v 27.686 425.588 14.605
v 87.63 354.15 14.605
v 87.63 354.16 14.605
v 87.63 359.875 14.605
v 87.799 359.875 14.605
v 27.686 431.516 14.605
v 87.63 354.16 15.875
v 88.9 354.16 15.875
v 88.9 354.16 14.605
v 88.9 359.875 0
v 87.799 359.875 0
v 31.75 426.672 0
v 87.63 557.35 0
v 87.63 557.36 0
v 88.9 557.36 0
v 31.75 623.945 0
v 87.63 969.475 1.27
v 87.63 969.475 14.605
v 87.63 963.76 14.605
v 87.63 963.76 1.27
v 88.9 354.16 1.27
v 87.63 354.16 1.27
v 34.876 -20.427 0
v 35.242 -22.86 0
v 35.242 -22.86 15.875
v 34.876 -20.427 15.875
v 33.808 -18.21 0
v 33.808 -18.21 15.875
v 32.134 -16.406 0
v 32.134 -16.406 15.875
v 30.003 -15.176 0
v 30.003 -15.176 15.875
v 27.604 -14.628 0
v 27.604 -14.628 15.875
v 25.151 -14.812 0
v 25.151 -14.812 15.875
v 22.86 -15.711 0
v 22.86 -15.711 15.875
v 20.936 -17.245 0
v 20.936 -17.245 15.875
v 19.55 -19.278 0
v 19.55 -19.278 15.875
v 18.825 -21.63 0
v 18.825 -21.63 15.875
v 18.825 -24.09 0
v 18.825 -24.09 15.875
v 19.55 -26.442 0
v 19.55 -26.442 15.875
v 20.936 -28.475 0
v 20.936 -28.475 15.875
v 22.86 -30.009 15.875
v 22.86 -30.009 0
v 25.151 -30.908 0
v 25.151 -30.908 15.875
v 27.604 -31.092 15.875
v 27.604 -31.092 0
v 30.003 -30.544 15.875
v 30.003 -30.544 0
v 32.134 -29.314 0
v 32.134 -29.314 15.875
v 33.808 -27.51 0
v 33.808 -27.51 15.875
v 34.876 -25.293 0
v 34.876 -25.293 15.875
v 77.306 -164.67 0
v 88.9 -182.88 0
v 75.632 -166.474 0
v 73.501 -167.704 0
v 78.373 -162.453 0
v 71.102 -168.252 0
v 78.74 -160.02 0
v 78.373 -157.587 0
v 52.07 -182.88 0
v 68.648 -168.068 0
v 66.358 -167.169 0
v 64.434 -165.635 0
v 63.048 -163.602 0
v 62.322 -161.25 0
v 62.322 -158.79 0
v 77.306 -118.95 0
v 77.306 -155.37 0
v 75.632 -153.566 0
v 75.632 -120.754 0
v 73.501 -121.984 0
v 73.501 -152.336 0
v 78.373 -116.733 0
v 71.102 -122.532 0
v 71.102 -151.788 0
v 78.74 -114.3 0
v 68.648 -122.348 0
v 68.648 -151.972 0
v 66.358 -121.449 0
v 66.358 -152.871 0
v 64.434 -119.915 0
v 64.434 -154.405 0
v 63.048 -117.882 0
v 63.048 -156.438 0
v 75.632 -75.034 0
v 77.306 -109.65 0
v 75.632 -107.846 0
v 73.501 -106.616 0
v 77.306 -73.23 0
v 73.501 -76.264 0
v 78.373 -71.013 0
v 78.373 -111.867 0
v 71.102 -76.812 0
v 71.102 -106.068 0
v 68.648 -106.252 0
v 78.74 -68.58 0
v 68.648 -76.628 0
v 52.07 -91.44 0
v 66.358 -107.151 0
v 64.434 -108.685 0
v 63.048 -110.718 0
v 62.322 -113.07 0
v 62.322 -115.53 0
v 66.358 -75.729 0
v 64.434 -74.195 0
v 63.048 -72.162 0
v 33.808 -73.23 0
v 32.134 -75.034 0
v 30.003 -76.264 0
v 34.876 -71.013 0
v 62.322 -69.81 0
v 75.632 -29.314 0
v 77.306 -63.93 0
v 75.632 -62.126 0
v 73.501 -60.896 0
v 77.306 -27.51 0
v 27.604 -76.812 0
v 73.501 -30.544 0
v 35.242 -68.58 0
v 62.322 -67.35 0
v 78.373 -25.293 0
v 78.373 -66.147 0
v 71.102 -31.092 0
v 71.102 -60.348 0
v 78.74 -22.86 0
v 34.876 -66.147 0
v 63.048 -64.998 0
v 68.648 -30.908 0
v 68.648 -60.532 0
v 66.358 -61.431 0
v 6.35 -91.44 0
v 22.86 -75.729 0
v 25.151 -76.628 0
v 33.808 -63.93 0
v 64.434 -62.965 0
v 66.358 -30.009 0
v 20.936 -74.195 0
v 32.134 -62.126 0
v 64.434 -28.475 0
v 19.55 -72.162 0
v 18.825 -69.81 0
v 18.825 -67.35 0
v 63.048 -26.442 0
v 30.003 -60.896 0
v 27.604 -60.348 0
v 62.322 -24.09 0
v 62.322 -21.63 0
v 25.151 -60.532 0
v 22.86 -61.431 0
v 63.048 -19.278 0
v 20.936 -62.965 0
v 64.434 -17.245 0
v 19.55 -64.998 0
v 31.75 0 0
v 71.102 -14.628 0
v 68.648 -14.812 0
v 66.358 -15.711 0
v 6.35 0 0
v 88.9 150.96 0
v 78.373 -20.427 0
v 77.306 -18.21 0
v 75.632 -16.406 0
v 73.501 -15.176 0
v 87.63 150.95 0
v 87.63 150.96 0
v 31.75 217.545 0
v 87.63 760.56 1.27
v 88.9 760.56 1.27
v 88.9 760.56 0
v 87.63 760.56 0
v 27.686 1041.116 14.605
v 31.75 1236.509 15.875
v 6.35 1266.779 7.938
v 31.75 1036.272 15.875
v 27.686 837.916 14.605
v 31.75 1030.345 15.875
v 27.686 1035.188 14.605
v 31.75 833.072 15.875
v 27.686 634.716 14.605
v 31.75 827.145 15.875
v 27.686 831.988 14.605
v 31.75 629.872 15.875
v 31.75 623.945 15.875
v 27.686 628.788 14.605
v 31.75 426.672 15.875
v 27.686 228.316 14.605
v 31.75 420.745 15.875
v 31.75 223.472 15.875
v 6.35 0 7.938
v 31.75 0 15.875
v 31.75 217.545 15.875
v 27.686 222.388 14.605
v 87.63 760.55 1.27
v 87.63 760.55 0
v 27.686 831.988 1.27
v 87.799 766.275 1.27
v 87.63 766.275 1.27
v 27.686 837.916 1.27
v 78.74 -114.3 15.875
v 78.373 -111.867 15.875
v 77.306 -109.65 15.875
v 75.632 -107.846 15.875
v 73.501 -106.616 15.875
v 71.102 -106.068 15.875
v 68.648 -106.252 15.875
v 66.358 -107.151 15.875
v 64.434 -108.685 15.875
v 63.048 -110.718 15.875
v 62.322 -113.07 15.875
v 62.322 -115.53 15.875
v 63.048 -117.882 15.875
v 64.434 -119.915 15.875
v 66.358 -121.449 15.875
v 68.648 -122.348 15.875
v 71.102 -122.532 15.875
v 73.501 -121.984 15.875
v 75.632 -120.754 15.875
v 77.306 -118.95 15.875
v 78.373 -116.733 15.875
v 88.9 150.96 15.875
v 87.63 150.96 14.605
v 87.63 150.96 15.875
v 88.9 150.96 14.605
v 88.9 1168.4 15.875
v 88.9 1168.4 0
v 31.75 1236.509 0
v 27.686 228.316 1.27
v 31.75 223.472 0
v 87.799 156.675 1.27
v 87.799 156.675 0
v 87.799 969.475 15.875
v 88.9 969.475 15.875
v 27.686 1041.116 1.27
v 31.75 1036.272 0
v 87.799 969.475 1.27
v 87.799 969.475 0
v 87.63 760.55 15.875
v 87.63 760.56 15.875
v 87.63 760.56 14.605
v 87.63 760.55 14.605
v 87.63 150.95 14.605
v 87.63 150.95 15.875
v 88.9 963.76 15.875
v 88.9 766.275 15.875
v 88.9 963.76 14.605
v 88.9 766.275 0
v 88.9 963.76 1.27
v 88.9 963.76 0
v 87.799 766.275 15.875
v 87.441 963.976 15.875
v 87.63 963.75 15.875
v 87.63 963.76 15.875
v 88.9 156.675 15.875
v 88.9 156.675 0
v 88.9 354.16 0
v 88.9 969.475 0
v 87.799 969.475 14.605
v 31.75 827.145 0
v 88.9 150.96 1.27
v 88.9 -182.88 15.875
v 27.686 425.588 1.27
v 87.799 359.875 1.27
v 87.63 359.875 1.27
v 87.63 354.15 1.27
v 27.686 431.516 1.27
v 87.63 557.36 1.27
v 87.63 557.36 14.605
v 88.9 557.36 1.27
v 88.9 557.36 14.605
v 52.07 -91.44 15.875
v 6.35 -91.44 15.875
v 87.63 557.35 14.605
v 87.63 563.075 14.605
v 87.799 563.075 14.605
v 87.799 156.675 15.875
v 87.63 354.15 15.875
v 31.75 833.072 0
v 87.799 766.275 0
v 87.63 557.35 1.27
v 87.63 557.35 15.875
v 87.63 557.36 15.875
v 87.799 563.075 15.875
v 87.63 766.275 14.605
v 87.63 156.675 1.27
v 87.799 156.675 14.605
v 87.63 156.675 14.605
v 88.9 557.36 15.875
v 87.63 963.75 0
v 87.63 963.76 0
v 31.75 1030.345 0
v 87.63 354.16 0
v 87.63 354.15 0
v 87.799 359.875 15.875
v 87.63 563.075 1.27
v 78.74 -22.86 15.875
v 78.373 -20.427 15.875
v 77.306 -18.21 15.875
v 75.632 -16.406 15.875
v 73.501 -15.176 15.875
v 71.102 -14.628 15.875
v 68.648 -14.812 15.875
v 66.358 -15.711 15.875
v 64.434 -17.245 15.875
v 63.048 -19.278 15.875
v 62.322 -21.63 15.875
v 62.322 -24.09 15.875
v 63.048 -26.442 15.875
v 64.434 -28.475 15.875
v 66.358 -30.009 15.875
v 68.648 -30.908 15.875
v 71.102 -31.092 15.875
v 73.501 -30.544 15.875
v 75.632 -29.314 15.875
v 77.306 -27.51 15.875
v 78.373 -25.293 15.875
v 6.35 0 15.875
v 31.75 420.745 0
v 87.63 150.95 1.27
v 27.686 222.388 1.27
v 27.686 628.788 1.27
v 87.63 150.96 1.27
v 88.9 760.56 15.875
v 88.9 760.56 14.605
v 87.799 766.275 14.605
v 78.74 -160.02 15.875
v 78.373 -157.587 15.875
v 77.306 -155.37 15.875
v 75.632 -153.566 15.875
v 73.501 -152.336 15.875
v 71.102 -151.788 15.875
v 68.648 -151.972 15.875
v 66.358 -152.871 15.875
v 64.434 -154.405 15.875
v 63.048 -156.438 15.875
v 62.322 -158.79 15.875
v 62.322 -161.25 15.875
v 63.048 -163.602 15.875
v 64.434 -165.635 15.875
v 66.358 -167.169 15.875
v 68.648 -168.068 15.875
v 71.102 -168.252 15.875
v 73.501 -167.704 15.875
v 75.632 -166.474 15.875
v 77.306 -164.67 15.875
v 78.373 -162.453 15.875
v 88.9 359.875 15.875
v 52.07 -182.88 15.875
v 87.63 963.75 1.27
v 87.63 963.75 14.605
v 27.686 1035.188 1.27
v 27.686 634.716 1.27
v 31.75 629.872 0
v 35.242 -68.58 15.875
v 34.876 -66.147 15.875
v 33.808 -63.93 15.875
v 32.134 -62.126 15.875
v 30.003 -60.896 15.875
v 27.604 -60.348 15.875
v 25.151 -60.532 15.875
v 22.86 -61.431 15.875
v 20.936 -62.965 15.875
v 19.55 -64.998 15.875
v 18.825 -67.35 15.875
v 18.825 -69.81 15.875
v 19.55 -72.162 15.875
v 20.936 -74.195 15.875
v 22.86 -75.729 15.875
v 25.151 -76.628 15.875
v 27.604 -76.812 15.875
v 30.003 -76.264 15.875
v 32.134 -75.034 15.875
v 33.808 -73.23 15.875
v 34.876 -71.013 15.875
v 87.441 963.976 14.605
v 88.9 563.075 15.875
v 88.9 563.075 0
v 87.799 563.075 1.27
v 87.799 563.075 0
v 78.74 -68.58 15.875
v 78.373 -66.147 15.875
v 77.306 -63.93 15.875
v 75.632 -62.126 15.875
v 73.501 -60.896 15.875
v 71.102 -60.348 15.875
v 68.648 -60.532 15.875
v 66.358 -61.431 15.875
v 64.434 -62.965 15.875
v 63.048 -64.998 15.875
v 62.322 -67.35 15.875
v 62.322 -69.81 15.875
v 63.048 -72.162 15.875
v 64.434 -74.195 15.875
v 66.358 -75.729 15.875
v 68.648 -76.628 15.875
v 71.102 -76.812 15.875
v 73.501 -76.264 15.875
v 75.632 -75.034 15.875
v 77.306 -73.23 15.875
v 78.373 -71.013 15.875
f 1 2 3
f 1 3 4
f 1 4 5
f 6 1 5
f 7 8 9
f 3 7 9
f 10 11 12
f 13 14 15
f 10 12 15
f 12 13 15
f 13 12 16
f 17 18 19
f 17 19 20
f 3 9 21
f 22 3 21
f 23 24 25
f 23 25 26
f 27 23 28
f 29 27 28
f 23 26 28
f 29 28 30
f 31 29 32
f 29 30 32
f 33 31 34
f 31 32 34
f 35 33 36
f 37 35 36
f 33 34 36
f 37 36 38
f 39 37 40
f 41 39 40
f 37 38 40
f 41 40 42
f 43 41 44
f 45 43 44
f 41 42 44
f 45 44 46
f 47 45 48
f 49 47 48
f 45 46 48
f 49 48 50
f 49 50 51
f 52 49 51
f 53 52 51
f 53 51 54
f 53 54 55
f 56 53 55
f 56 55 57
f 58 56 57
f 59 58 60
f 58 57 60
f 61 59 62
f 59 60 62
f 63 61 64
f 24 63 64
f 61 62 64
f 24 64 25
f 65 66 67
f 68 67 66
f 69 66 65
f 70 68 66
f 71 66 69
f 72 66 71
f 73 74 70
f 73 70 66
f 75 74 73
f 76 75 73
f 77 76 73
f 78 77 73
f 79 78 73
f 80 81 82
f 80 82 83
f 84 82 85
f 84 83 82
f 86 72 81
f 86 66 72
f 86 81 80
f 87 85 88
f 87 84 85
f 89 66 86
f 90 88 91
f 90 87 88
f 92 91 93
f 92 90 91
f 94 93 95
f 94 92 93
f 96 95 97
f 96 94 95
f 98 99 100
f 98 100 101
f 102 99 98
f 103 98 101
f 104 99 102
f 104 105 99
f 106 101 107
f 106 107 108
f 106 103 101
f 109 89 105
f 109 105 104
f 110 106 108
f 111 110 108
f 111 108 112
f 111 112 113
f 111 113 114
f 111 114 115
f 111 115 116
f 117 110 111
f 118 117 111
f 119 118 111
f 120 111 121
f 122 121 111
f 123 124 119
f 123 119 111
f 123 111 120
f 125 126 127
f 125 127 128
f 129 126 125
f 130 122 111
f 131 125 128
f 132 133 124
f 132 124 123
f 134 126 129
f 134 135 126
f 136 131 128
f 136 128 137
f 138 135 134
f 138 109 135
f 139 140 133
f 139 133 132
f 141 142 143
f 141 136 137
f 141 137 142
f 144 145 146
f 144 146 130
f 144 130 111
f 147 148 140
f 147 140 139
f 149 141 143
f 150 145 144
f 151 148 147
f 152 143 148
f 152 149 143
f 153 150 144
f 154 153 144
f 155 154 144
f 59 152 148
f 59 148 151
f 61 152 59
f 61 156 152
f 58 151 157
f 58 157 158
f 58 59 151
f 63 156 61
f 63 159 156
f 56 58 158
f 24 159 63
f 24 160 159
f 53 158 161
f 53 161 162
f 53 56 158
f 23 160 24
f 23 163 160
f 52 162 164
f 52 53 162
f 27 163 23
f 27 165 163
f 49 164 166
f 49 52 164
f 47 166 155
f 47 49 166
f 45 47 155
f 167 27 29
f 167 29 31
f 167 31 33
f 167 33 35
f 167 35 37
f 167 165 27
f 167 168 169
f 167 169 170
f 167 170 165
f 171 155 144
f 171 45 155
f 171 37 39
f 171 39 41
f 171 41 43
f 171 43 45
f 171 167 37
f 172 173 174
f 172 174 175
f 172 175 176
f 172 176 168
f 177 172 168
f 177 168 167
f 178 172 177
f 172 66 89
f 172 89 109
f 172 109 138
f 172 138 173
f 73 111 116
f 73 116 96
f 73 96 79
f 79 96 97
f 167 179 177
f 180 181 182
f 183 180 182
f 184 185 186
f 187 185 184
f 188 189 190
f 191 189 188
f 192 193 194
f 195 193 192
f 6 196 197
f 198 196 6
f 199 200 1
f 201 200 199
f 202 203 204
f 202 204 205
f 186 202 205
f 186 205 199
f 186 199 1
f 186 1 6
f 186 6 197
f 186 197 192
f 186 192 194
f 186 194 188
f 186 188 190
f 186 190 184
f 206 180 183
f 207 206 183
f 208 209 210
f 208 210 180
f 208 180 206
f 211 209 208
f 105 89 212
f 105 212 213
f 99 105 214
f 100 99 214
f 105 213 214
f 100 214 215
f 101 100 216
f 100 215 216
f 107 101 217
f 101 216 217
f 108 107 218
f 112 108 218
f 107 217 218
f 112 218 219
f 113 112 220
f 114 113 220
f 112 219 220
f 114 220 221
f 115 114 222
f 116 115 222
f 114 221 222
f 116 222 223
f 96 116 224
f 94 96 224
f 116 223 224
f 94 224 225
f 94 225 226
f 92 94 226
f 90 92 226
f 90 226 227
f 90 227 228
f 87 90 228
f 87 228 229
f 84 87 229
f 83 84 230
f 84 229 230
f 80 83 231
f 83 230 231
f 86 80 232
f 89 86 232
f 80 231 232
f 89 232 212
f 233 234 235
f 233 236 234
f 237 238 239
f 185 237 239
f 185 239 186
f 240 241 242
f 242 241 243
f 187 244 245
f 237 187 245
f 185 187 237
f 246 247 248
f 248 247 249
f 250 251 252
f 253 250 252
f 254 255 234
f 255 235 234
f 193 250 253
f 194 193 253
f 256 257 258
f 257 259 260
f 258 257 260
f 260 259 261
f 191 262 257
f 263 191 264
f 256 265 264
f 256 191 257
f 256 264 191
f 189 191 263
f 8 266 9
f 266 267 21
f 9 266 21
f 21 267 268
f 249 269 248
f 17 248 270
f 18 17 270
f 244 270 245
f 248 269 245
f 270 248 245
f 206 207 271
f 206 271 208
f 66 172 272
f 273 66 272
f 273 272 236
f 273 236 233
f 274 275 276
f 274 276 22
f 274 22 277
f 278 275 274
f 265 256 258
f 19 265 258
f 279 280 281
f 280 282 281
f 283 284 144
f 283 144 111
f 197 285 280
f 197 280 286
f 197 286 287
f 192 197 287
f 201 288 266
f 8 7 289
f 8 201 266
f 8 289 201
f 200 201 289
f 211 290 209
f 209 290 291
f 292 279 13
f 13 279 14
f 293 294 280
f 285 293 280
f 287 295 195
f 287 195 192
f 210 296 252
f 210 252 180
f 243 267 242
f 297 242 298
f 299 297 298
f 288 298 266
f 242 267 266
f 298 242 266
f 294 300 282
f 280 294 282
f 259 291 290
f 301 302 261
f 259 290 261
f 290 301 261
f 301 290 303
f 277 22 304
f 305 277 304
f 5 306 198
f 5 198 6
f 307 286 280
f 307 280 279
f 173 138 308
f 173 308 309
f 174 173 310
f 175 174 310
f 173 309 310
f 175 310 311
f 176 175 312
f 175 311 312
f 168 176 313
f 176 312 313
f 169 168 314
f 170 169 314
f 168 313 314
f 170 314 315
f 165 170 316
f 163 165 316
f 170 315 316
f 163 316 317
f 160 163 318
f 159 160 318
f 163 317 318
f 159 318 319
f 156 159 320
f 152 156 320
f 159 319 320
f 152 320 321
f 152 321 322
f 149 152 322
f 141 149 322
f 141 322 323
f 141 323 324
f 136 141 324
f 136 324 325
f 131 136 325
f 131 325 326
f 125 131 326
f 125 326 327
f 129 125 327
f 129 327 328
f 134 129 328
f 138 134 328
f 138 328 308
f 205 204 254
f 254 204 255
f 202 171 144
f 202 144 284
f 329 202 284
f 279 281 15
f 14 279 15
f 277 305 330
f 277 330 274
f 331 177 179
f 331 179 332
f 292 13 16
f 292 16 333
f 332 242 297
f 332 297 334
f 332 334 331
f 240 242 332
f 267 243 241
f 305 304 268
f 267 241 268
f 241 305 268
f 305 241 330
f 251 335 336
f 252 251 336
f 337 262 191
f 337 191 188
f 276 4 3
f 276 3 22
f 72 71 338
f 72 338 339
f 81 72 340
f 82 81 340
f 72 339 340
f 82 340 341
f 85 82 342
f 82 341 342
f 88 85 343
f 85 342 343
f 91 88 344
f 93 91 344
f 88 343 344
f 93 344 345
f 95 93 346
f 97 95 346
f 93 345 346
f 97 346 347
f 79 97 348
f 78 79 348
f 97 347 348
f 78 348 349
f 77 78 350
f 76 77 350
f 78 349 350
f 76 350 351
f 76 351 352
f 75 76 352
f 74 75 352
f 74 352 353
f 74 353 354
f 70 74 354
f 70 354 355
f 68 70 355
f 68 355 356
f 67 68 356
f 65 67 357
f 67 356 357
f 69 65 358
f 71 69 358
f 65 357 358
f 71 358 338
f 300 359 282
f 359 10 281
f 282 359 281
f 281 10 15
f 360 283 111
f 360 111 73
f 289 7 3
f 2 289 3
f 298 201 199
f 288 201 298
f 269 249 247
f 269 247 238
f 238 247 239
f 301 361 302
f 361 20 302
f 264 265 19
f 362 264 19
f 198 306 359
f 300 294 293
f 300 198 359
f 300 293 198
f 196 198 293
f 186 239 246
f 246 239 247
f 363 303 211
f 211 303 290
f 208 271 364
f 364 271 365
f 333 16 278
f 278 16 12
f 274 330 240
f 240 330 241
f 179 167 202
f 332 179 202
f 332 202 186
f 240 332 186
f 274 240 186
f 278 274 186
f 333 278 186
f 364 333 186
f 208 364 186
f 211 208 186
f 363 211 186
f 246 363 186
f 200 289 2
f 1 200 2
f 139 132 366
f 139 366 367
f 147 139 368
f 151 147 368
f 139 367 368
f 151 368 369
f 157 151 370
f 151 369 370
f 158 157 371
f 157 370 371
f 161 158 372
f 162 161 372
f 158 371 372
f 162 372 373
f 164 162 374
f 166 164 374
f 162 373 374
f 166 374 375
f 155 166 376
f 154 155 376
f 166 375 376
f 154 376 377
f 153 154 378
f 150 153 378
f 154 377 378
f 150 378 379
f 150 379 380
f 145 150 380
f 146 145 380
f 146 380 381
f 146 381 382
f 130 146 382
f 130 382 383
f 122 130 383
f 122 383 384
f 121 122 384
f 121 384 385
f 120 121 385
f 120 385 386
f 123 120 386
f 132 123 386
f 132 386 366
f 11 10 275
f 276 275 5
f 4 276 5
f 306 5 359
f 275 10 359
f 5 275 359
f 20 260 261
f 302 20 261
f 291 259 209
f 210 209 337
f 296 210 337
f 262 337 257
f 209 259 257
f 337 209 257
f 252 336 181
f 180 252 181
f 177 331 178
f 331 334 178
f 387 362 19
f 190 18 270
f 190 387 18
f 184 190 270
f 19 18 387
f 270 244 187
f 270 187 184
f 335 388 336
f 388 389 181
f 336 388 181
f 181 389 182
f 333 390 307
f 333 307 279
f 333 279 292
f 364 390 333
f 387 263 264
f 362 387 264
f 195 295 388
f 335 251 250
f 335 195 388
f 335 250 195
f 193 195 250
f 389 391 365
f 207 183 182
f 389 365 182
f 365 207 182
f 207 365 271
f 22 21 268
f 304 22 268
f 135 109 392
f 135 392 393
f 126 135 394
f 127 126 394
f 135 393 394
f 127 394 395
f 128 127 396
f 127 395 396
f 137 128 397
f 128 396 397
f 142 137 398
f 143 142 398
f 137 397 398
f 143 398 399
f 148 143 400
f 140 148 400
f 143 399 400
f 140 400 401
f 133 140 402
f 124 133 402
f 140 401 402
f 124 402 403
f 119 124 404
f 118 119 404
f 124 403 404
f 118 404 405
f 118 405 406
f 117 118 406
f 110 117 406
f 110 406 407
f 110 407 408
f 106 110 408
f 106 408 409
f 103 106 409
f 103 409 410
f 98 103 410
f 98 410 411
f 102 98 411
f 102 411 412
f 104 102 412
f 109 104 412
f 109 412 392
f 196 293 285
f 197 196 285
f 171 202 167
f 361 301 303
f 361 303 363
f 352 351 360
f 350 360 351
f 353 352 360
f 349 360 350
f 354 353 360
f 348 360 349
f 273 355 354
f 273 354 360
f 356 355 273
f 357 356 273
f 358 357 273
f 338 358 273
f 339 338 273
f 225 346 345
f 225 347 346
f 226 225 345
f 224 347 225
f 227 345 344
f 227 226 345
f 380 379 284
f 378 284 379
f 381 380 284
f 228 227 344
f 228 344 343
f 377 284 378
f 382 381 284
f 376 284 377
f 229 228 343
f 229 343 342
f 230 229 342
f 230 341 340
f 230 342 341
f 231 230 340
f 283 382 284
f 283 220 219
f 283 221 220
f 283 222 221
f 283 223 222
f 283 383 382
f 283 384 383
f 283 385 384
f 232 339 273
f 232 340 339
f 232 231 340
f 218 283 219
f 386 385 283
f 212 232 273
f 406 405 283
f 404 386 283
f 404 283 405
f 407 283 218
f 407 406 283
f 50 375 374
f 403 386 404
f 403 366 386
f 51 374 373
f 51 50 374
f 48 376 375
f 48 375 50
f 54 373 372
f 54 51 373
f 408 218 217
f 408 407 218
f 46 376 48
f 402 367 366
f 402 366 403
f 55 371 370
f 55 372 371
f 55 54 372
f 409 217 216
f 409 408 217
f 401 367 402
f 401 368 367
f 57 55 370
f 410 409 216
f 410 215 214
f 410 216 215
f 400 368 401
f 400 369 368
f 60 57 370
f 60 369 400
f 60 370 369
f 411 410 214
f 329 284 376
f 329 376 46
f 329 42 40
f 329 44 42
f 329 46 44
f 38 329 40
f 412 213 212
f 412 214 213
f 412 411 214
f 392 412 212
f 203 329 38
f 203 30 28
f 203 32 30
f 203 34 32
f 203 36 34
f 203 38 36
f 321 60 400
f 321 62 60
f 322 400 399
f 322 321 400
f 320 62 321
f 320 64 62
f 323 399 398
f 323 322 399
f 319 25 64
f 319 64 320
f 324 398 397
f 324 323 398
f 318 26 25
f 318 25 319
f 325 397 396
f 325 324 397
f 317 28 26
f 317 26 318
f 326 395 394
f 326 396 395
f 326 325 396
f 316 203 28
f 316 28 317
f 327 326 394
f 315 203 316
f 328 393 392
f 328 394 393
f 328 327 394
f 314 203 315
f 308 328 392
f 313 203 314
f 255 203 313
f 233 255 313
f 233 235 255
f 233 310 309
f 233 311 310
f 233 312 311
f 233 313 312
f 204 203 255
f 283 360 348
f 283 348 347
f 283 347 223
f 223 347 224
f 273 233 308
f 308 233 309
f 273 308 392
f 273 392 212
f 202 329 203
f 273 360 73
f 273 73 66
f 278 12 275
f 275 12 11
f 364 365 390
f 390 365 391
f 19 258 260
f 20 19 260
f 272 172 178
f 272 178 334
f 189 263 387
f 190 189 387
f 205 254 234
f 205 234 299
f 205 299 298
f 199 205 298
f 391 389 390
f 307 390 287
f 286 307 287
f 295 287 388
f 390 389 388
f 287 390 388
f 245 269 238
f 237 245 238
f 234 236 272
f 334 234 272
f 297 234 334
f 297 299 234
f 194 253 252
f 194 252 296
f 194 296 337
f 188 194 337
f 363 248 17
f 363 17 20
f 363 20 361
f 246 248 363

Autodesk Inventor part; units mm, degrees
ref_plane "YZ Plane" through (0, 0, 0) normal (1, 0, 0) x (0, 1, 0)
ref_plane "XZ Plane" through (0, 0, 0) normal (0, 1, 0) x (-1, 0, 0)
ref_plane "XY Plane" through (0, 0, 0) normal (0, 0, 1) x (1, 0, 0)
sketch "Sketch1" plane through (0, 0, 0) normal (0, 0, 1) x (1, 0, 0)
  line L0 (0, 0) -> (88.9, 0)
  line L1 (88.9, 0) -> (88.9, 1168.4)
  line L2 (0, 1168.4) -> (0, 0)
  line L3 (-1378.8531, -765.1447) -> (-1378.8531, 1773.0142) construction
  line L4 (-1378.8531, 1773.0142) -> (415.5122, 1773.0142) construction
  line L5 (415.5122, 1773.0142) -> (415.5122, -765.1447) construction
  line L6 (415.5122, -765.1447) -> (-1378.8531, -765.1447) construction
  line L7 (44.45, 1168.4) -> (176.9474, 1168.4) construction
  line L8 (0, 1168.4) -> (0, 1119.7734)
  line L9 (88.9, 1168.4) -> (0, 1274.3469)
  line L10 (0, 1168.4) -> (0, 1274.3469)
  line L11 (88.9, 1168.4) -> (88.9, 1229.5585)
  line L12 (88.9, 1168.4) -> (88.9, 965.2)
  line L13 (88.9, 965.2) -> (88.9, 762)
  line L14 (88.9, 762) -> (88.9, 558.8)
  line L15 (88.9, 558.8) -> (88.9, 355.6)
  line L16 (88.9, 355.6) -> (88.9, 152.4)
  line L17 (88.9, 965.2) -> (-57.897, 1140.1458)
  line L18 (88.9, 965.2) -> (317.2756, 965.2) construction
  line L19 (88.9, 762) -> (-57.897, 936.9458)
  line L20 (88.9, 762) -> (317.2756, 762) construction
  line L21 (88.9, 558.8) -> (-71.0436, 749.4133)
  line L22 (88.9, 558.8) -> (337.728, 558.8) construction
  line L23 (88.9, 355.6) -> (-47.9591, 518.7023)
  line L24 (88.9, 355.6) -> (301.815, 355.6) construction
  line L25 (88.9, 152.4) -> (-31.1466, 295.4659)
  line L26 (88.9, 152.4) -> (275.6593, 152.4) construction
  line L27 (88.9, 152.4) -> (137.8508, 94.0627)
  line L28 (88.9, 355.6) -> (128.9332, 307.8903)
  line L29 (88.9, 558.8) -> (137.8508, 500.4627)
  line L30 (88.9, 762) -> (152.1538, 686.617)
  line L31 (-57.897, 936.9458) -> (152.1538, 686.617)
  line L32 (-71.0436, 749.4133) -> (137.8508, 500.4627)
  line L33 (-47.9591, 518.7023) -> (128.9332, 307.8903)
  line L34 (-31.1466, 295.4659) -> (137.8508, 94.0627)
  line L35 (164.9833, 874.5275) -> (-78.8863, 1165.1599)
  line L36 (90.3593, 966.4245) -> (-56.4377, 1141.3704)
  line L37 (87.4407, 963.9755) -> (-59.3563, 1138.9213)
  line L38 (157.3047, 680.4784) -> (-71.0436, 952.6133)
  line L39 (158.764, 681.7029) -> (-69.5842, 953.8378)
  line L40 (155.8454, 679.2539) -> (-72.5029, 951.3888)
  line L41 (144.9042, 492.0568) -> (-84.555, 765.5156)
  line L42 (146.3635, 493.2813) -> (-83.0956, 766.7401)
  line L43 (143.4449, 490.8323) -> (-86.0143, 764.2911)
  line L44 (137.8508, 297.2627) -> (-69.5842, 544.4742)
  line L45 (139.3101, 298.4872) -> (-68.1249, 545.6987)
  line L46 (136.3915, 296.0382) -> (-71.0436, 543.2497)
  line L47 (-41.5719, 307.8903) -> (172.2961, 53.0124)
  line L48 (-40.1126, 309.1148) -> (173.7555, 54.2369)
  line L49 (-43.0312, 306.6658) -> (170.8368, 51.7878)
  line L50 (87.4407, 963.9755) -> (94.264, 955.8438)
  dimension "d0" = 88.9
  dimension "d1" = 1168.4
  dimension "d23" = 40
  dimension "d37" = 1.905
  dimension "d38" = 1.905
  dimension "d39" = 1.905
  dimension "d40" = 1.905
  dimension "d41" = 1.905
  dimension "d42" = 1.905
  dimension "d43" = 1.905
  dimension "d44" = 1.905
  dimension "d45" = 1.905
  dimension "d46" = 1.905
  dimension "d129" = 105.9469
extrude "Extrusion1" add sketch "Sketch1" along normal blind 15.875
sketch "Sketch2" plane through (0, 0, 15.875) normal (0, 0, 1) x (1, 0, 0)
  line L0 (0, 0) -> (88.9, 0)
  line L1 (88.9, 0) -> (88.9, 1168.4)
  line L2 (0, 1168.4) -> (0, 0)
  line L3 (-1378.8531, -765.1447) -> (-1378.8531, 1773.0142) construction
  line L4 (-1378.8531, 1773.0142) -> (415.5122, 1773.0142) construction
  line L5 (415.5122, 1773.0142) -> (415.5122, -765.1447) construction
  line L6 (415.5122, -765.1447) -> (-1378.8531, -765.1447) construction
  line L7 (44.45, 1168.4) -> (176.9474, 1168.4) construction
  line L8 (0, 1168.4) -> (0, 1119.7734)
  line L9 (88.9, 1168.4) -> (0, 1274.3469)
  line L10 (0, 1168.4) -> (0, 1274.3469)
  line L11 (88.9, 1168.4) -> (88.9, 1229.5585)
  line L12 (88.9, 1168.4) -> (88.9, 965.2)
  line L13 (88.9, 965.2) -> (88.9, 762)
  line L14 (88.9, 762) -> (88.9, 558.8)
  line L15 (88.9, 558.8) -> (88.9, 355.6)
  line L16 (88.9, 355.6) -> (88.9, 152.4)
  line L17 (88.9, 965.2) -> (-57.897, 1140.1458)
  line L18 (88.9, 965.2) -> (317.2756, 965.2) construction
  line L19 (88.9, 762) -> (-57.897, 936.9458)
  line L20 (88.9, 762) -> (317.2756, 762) construction
  line L21 (88.9, 558.8) -> (-71.0436, 749.4133)
  line L22 (88.9, 558.8) -> (337.728, 558.8) construction
  line L23 (88.9, 355.6) -> (-47.9591, 518.7023)
  line L24 (88.9, 355.6) -> (301.815, 355.6) construction
  line L25 (88.9, 152.4) -> (-31.1466, 295.4659)
  line L26 (88.9, 152.4) -> (275.6593, 152.4) construction
  line L27 (88.9, 152.4) -> (137.8508, 94.0627)
  line L28 (88.9, 355.6) -> (128.9332, 307.8903)
  line L29 (88.9, 558.8) -> (137.8508, 500.4627)
  line L30 (88.9, 762) -> (152.1538, 686.617)
  line L31 (-57.897, 936.9458) -> (152.1538, 686.617)
  line L32 (-71.0436, 749.4133) -> (137.8508, 500.4627)
  line L33 (-47.9591, 518.7023) -> (128.9332, 307.8903)
  line L34 (-31.1466, 295.4659) -> (137.8508, 94.0627)
  line L35 (164.9833, 874.5275) -> (-78.8863, 1165.1599)
  line L36 (90.3593, 966.4245) -> (-56.4377, 1141.3704)
  line L37 (87.4407, 963.9755) -> (-59.3563, 1138.9213)
  line L38 (157.3047, 680.4784) -> (-71.0436, 952.6133)
  line L39 (158.764, 681.7029) -> (-69.5842, 953.8378)
  line L40 (155.8454, 679.2539) -> (-72.5029, 951.3888)
  line L41 (144.9042, 492.0568) -> (-84.555, 765.5156)
  line L42 (146.3635, 493.2813) -> (-83.0956, 766.7401)
  line L43 (143.4449, 490.8323) -> (-86.0143, 764.2911)
  line L44 (137.8508, 297.2627) -> (-69.5842, 544.4742)
  line L45 (139.3101, 298.4872) -> (-68.1249, 545.6987)
  line L46 (136.3915, 296.0382) -> (-71.0436, 543.2497)
  line L47 (-41.5719, 307.8903) -> (172.2961, 53.0124)
  line L48 (-40.1126, 309.1148) -> (173.7555, 54.2369)
  line L49 (-43.0312, 306.6658) -> (170.8368, 51.7878)
  line L50 (87.4407, 963.9755) -> (94.264, 955.8438)
  point P0 (88.9, 962.2363)
  point P1 (88.9, 968.1637)
  point P2 (0, 1074.1105)
  point P3 (0, 1068.1832)
  point P4 (0, 864.9832)
  point P5 (88.9, 759.0363)
  point P6 (88.9, 764.9637)
  point P7 (0, 870.9105)
  point P8 (0, 661.7832)
  point P9 (88.9, 555.8363)
  point P10 (88.9, 561.7637)
  point P11 (0, 667.7105)
  point P12 (0, 458.5832)
  point P13 (88.9, 352.6363)
  point P14 (88.9, 358.5637)
  point P15 (0, 464.5105)
  point P16 (88.9, 155.3637)
  point P17 (0, 261.3105)
  point P18 (0, 255.3832)
  point P19 (88.9, 149.4363)
  dimension "d49" = 88.9
  dimension "d50" = 1168.4
  dimension "d51" = 40
  dimension "d52" = 1.905
  dimension "d53" = 1.905
  dimension "d54" = 1.905
  dimension "d55" = 1.905
  dimension "d56" = 1.905
  dimension "d57" = 1.905
  dimension "d58" = 1.905
  dimension "d59" = 1.905
  dimension "d60" = 1.905
  dimension "d61" = 1.905
extrude "Extrusion2" cut sketch "Sketch2" against normal blind 1.27 contours L2 L25 L1 L49 | L2 L48 L1 L25 | L2 L23 L1 L46 | L2 L45 L1 L23 | L2 L21 L1 L43 | L2 L42 L1 L21 | L2 L19 L1 L40 | L2 L39 L1 L19 | L2 L17 L1 L50 L37 | L2 L36 L1 L17
sketch "Sketch3" plane through (0, 0, 0) normal (0, 0, -1) x (-1, 0, 0)
  line L0 (-88.9, 149.4363) -> (0, 255.3832) projected
  line L1 (0, 261.3105) -> (-88.9, 155.3637) projected
  line L2 (0, 464.5105) -> (-88.9, 358.5637) projected
  line L3 (-88.9, 352.6363) -> (0, 458.5832) projected
  line L4 (-88.9, 555.8363) -> (0, 661.7832) projected
  line L5 (0, 667.7105) -> (-88.9, 561.7637) projected
  line L6 (-88.9, 759.0363) -> (0, 864.9832) projected
  line L7 (0, 870.9105) -> (-88.9, 764.9637) projected
  line L8 (-88.9, 962.2363) -> (0, 1068.1832) projected
  line L9 (0, 1074.1105) -> (-88.9, 968.1637) projected
  line L10 (0, 1274.3469) -> (0, 0) projected
  line L11 (-88.9, 1168.4) -> (0, 1274.3469) projected
  line L12 (-88.9, 0) -> (-88.9, 1168.4) projected
  line L13 (0, 0) -> (-88.9, 0) projected
extrude "Extrusion3" cut sketch "Sketch3" against normal blind 1.27 contours L12 L1 L10 L0 | L12 L2 L10 L3 | L12 L5 L10 L4 | L12 L7 L10 L6 | L12 L9 L10 L8
sketch "Sketch4" plane through (88.9, 968.1637, 15.875) normal (1, 0, 0) x (0, 0, -1)
  line L0 (-0.8567, 45.5077) -> (24.5433, 45.5077)
  line L1 (24.5433, 45.5077) -> (24.5433, 51.2227)
  line L2 (24.5433, 51.2227) -> (-0.8567, 51.2227)
  line L3 (-0.8567, 51.2227) -> (-0.8567, 45.5077)
  line L4 (1.27, -5.9273) -> (0, -5.9273) projected
  line L5 (0, -5.9273) -> (0, -4.4033)
  line L6 (0, 100.0196) -> (0, -97.2531) projected
  line L7 (-3.6064, -4.4033) -> (23.6569, -4.4033)
  line L8 (23.6569, -4.4033) -> (23.6569, 1.3117)
  line L9 (23.6569, 1.3117) -> (-3.6064, 1.3117)
  line L10 (-3.6064, 1.3117) -> (-3.6064, -4.4033)
  line L11 (1.27, -818.7273) -> (0, -818.7273) projected
  line L12 (0, -818.7273) -> (0, -817.2033)
  line L13 (0, -712.7804) -> (0, -968.1637) projected
  line L14 (1.27, -615.5273) -> (0, -615.5273) projected
  line L15 (0, -615.5273) -> (0, -614.0033)
  line L16 (0, -615.5273) -> (0, -509.5804) projected
  line L17 (1.27, -412.3273) -> (0, -412.3273) projected
  line L18 (0, -412.3273) -> (0, -410.8033)
  line L19 (0, -306.3804) -> (0, -503.6531) projected
  line L20 (1.27, -209.1273) -> (0, -209.1273) projected
  line L21 (0, -209.1273) -> (0, -207.6033)
  line L22 (0, -103.1804) -> (0, -300.4531) projected
  line L23 (-2.1765, -817.2033) -> (18.224, -817.2033)
  line L24 (18.224, -817.2033) -> (18.224, -811.4883)
  line L25 (18.224, -811.4883) -> (-2.1765, -811.4883)
  line L26 (-2.1765, -811.4883) -> (-2.1765, -817.2033)
  line L27 (-1.5796, -614.0033) -> (23.8204, -614.0033)
  line L28 (23.8204, -614.0033) -> (23.8204, -608.2883)
  line L29 (23.8204, -608.2883) -> (-1.5796, -608.2883)
  line L30 (-1.5796, -608.2883) -> (-1.5796, -614.0033)
  line L31 (-2.2774, -410.8033) -> (22.0155, -410.8033)
  line L32 (22.0155, -410.8033) -> (22.0155, -405.0883)
  line L33 (22.0155, -405.0883) -> (-2.2774, -405.0883)
  line L34 (-2.2774, -405.0883) -> (-2.2774, -410.8033)
  line L35 (-1.5796, -207.6033) -> (20.5708, -207.6033)
  line L36 (20.5708, -207.6033) -> (20.5708, -201.8883)
  line L37 (20.5708, -201.8883) -> (-1.5796, -201.8883)
  line L38 (-1.5796, -201.8883) -> (-1.5796, -207.6033)
  point P0 (15.875, -968.1637)
  point P1 (0, -201.8883)
  point P2 (0, -811.4883)
  point P3 (0, -608.2883)
  point P4 (0, -405.0883)
  point P5 (0, 1.3117)
  point P6 (0, -4.4033)
  dimension "d74" = 5.715
  dimension "d75" = 25.4
  dimension "d76" = 1.524
  dimension "d79" = 5.715
  dimension "d80" = 1.524
  dimension "d81" = 1.524
  dimension "d82" = 1.524
  dimension "d83" = 1.524
  dimension "d85" = 5.715
  dimension "d86" = 25.4
  dimension "d87" = 5.715
  dimension "d88" = 5.715
  dimension "d89" = 5.715
extrude "Extrusion4" cut sketch "Sketch4" against normal blind 1.27 contours L9 L8 L7 L6 | L25 L24 L23 L13 | L16 L29 L28 L27 | L33 L32 L31 L19 | L37 L36 L35 L22
sketch "Sketch6" plane through (88.9, 766.2753, 0) normal (1, 0, 0) x (0, 0, -1)
  line L0 (-1.27, -615.315) -> (-14.605, -615.315)
  line L1 (-14.605, -615.315) -> (-14.605, -616.839)
  line L2 (-14.605, -616.839) -> (-15.875, -616.839)
  line L3 (-15.875, -766.2753) -> (-15.875, -616.839)
  line L4 (0, -766.2753) -> (-15.875, -766.2753)
  line L5 (0, -766.2753) -> (0, -616.839)
  line L6 (0, -616.839) -> (-1.27, -616.839)
  line L7 (-1.27, -616.839) -> (-1.27, -615.315)
  line L8 (-1.27, -412.115) -> (-14.605, -412.115)
  line L9 (-14.605, -412.115) -> (-14.605, -413.639)
  line L10 (-14.605, -413.639) -> (-15.875, -413.639)
  line L11 (-15.875, -609.6) -> (-15.875, -413.639)
  line L12 (-15.875, -609.6) -> (0, -609.6)
  line L13 (0, -609.6) -> (0, -413.639)
  line L14 (0, -413.639) -> (-1.27, -413.639)
  line L15 (-1.27, -413.639) -> (-1.27, -412.115)
  line L16 (0, -406.4) -> (0, -210.439)
  line L17 (-15.875, -406.4) -> (0, -406.4)
  line L18 (0, -406.4) -> (0, -210.439)
  line L19 (0, -210.439) -> (-1.27, -210.439)
  line L20 (-1.27, -210.439) -> (-1.27, -208.915)
  line L21 (-1.27, -208.915) -> (-14.605, -208.915)
  line L22 (-14.605, -208.915) -> (-14.605, -210.439)
  line L23 (-14.605, -210.439) -> (-15.875, -210.439)
  line L24 (-15.875, -406.4) -> (-15.875, -210.439)
  line L25 (-15.875, -203.2) -> (0, -203.2)
  line L26 (0, -203.2) -> (0, -7.239)
  line L27 (0, -7.239) -> (-1.27, -7.239)
  line L28 (-1.27, -7.239) -> (-1.27, -5.715)
  line L29 (-1.27, -5.715) -> (-14.605, -5.715)
  line L30 (-14.605, -5.715) -> (-14.605, -7.239)
  line L31 (-14.605, -7.239) -> (-15.875, -7.239)
  line L32 (-15.875, -203.2) -> (-15.875, -7.239)
  line L33 (-15.875, 0) -> (0, 0)
  line L34 (0, 0) -> (0, 195.961)
  line L35 (0, 195.961) -> (-1.27, 195.961)
  line L36 (-1.27, 195.961) -> (-1.27, 197.485)
  line L37 (-1.27, 197.485) -> (-14.605, 197.485)
  line L38 (-14.605, 197.485) -> (-14.605, 195.961)
  line L39 (-14.605, 195.961) -> (-15.875, 195.961)
  line L40 (-15.875, 0) -> (-15.875, 195.961)
  line L41 (-15.875, 203.2) -> (0, 203.2)
  line L42 (0, 203.2) -> (0, 402.1247)
  line L43 (0, 402.1247) -> (-15.875, 402.1247)
  line L44 (-15.875, 203.2) -> (-15.875, 402.1247)
  line L45 (0, 402.1247) -> (0, 508.0715)
  line L46 (0, 508.0715) -> (-15.875, 508.0715)
  line L47 (-15.875, 402.1247) -> (-15.875, 508.0715)
  line L48 (0, 402.1247) -> (-15.875, 402.1247)
  line L49 (-15.875, 195.961) -> (-15.875, 301.9079)
  line L50 (0, 195.961) -> (-1.27, 195.961)
  line L51 (-15.875, 197.485) -> (0, 197.485)
  line L52 (0, 197.485) -> (0, 195.961)
  line L53 (0, 195.961) -> (-15.875, 195.961)
  line L54 (-15.875, 195.961) -> (-15.875, 197.485)
  line L55 (-15.875, 98.7079) -> (-15.875, -98.5648)
  line L56 (0, -7.239) -> (-1.27, -7.239)
  line L57 (-15.875, -5.715) -> (0, -5.715)
  line L58 (0, -5.715) -> (0, -7.239)
  line L59 (0, -7.239) -> (-15.875, -7.239)
  line L60 (-15.875, -7.239) -> (-15.875, -5.715)
  line L61 (-15.875, -104.4921) -> (-15.875, -301.7648)
  line L62 (0, -104.4921) -> (0, -210.439)
  line L63 (-15.875, -208.915) -> (0, -208.915)
  line L64 (0, -208.915) -> (0, -210.439)
  line L65 (0, -210.439) -> (-15.875, -210.439)
  line L66 (-15.875, -210.439) -> (-15.875, -208.915)
  line L67 (-15.875, -413.639) -> (-15.875, -307.6921)
  line L68 (0, -307.6921) -> (0, -413.639)
  line L69 (-15.875, -412.115) -> (0, -412.115)
  line L70 (0, -412.115) -> (0, -413.639)
  line L71 (0, -413.639) -> (-15.875, -413.639)
  line L72 (-15.875, -413.639) -> (-15.875, -412.115)
  line L73 (-15.875, -616.839) -> (-15.875, -510.8921)
  line L74 (0, -510.8921) -> (0, -616.839)
  line L75 (-15.875, -615.315) -> (0, -615.315)
  line L76 (0, -615.315) -> (0, -616.839)
  line L77 (0, -616.839) -> (-15.875, -616.839)
  line L78 (-15.875, -616.839) -> (-15.875, -615.315)
extrude "Extrusion5" add sketch "Sketch6" against normal blind 1.27 contours L7 L77 L1 L0 | L75 L74 L6 L7 | L1 L2 L73 L75 | L14 L15 L69 L68 | L67 L69 L9 L10 | L71 L9 L8 L15 | L19 L20 L63 L62 | L65 L22 L21 L20 | L61 L63 L22 L23 | L27 L28 L57 L58 | L59 L30 L29 L28 | L55 L57 L30 L31 | L35 L36 L51 L52 | L49 L51 L38 L39 | L53 L38 L37 L36
sketch "Sketch8" plane through (0, 0, 15.875) normal (0, 0, 1) x (1, 0, 0)
  line L0 (0, -7.1275) -> (6.35, -7.1275)
  line L1 (6.35, -7.1275) -> (6.35, 1442.9398)
  line L2 (6.35, 1442.9398) -> (0, 1442.9398)
  line L3 (0, 1442.9398) -> (0, -7.1275)
  point P0 (0, 0)
  dimension "d94" = 6.35
extrude "Extrusion6" cut sketch "Sketch8" against normal through all
sketch "Sketch12" plane through (88.9, 0, 0) normal (0, -1, 0) x (1, 0, 0)
  line L0 (-82.55, 15.875) -> (-82.55, 14.605) projected
  line L1 (-82.55, 15.875) -> (-57.15, 15.875)
  line L2 (-82.55, 15.875) -> (-1.1006, 15.875) projected
  line L3 (-57.15, 15.875) -> (-82.55, 7.9375)
  line L4 (-82.55, 15.875) -> (-82.55, 0) projected
  line L5 (-82.55, 0) -> (-1.27, 0) projected
  line L6 (-82.55, 15.875) -> (-82.55, 0) projected
  line L7 (-82.55, 0) -> (0, 0) projected
  line L8 (0, 0) -> (0, 15.875) projected
  line L9 (-82.55, 15.875) -> (0, 15.875) projected
  line L10 (-57.15, 0) -> (-82.55, 7.9375)
  point P0 (-88.9, 0)
  dimension "d104" = 25.4
extrude "Extrusion8" cut sketch "Sketch12" against normal through all contours L1 L3 L4 L0 | L10 L5 L4
sketch "Sketch13" plane through (88.9, 0, 0) normal (0, -1, 0) x (1, 0, 0)
  line L0 (0, 0) -> (0, 15.875) projected
  line L1 (0, 0) -> (-82.55, 0)
  line L2 (-82.55, 0) -> (-82.55, 15.875)
  line L3 (-82.55, 15.875) -> (0, 15.875)
  line L4 (0, 15.875) -> (0, 0)
  point P0 (-88.9, 0)
extrude "Extrusion9" add sketch "Sketch13" along normal blind 184.15
sketch "Sketch14" plane through (0, 0, 15.875) normal (0, 0, 1) x (1, 0, 0)
  line L0 (6.35, 0) -> (6.35, -184.15) projected
  line L1 (6.35, 0) -> (6.35, -91.44)
  line L2 (6.35, -91.44) -> (52.07, -91.44)
  line L3 (52.07, -91.44) -> (52.07, -182.88)
  line L4 (52.07, -182.88) -> (88.9, -182.88)
  line L5 (88.9, 150.9603) -> (88.9, -184.15) projected
  line L6 (31.75, 217.5451) -> (31.75, 0) projected
  line L7 (31.75, 0) -> (6.35, 0) projected
  line L8 (6.35, 0) -> (6.35, -184.15) projected
  line L9 (88.9, -184.15) -> (6.35, -184.15) projected
  line L10 (88.9, 150.9603) -> (88.9, -184.15) projected
  line L11 (88.9, 150.9603) -> (87.63, 150.9603) projected
  line L12 (87.63, 150.9499) -> (87.63, 150.9603) projected
  line L13 (87.63, 150.9499) -> (31.75, 217.5451) projected
  point P0 (0, 0)
  dimension "d109" = 91.44
  dimension "d112" = 45.72
  dimension "d113" = 91.44
  dimension "d131" = 36.83
extrude "Extrusion10" cut sketch "Sketch14" against normal blind 184.15 contours L2 L3 L4 L5 L9 L0
sketch "Sketch17" plane through (0, 0, 15.875) normal (0, 0, 1) x (1, 0, 0)
  line L0 (6.35, 0) -> (6.35, -91.44) projected
  line L1 (47.625, -45.72) -> (6.35, -45.72)
  line L2 (6.35, -45.72) -> (6.35, 0)
  line L3 (6.35, 0) -> (47.625, 0)
  line L4 (47.625, 0) -> (47.625, -45.72)
  line L5 (88.9, 150.9603) -> (88.9, -182.88) projected
  line L6 (47.625, -45.72) -> (88.9, -45.72)
  line L7 (88.9, -45.72) -> (88.9, 0)
  line L8 (88.9, 0) -> (47.625, 0)
  line L9 (47.625, 0) -> (47.625, -45.72)
  line L10 (47.625, -45.72) -> (88.9, -45.72)
  line L11 (88.9, -45.72) -> (88.9, -91.44)
  line L12 (88.9, -91.44) -> (47.625, -91.44)
  line L13 (47.625, -91.44) -> (47.625, -45.72)
  line L14 (6.35, -91.44) -> (52.07, -91.44) projected
  line L15 (47.625, -45.72) -> (6.35, -45.72)
  line L16 (6.35, -45.72) -> (6.35, -91.44)
  line L17 (6.35, -91.44) -> (47.625, -91.44)
  line L18 (47.625, -91.44) -> (47.625, -45.72)
  line L19 (52.07, -182.88) -> (88.9, -182.88)
  line L20 (88.9, -182.88) -> (88.9, -137.16)
  line L21 (88.9, -137.16) -> (52.07, -137.16)
  line L22 (52.07, -137.16) -> (52.07, -182.88)
  line L23 (52.07, -137.16) -> (88.9, -137.16)
  line L24 (88.9, -137.16) -> (88.9, -91.44)
  line L25 (88.9, -91.44) -> (52.07, -91.44)
  line L26 (52.07, -91.44) -> (52.07, -137.16)
  circle A0 centre (26.9875, -22.86) radius 8.255
  circle A1 centre (70.485, -22.86) radius 8.255
  circle A2 centre (70.485, -68.58) radius 8.255
  circle A3 centre (26.9875, -68.58) radius 8.255
  circle A4 centre (70.485, -114.3) radius 8.255
  circle A5 centre (70.485, -160.02) radius 8.255
  point P0 (70.485, -137.16)
  dimension "d120" = 16.51
  dimension "d121" = 16.51
  dimension "d122" = 16.51
  dimension "d123" = 16.51
  dimension "d124" = 16.51
  dimension "d125" = 16.51
extrude "Extrusion11" cut sketch "Sketch17" against normal blind 25.4 contours A0 | A1 | A2 | A3 | A4 | A5
properties part number "blade c 3.25"
